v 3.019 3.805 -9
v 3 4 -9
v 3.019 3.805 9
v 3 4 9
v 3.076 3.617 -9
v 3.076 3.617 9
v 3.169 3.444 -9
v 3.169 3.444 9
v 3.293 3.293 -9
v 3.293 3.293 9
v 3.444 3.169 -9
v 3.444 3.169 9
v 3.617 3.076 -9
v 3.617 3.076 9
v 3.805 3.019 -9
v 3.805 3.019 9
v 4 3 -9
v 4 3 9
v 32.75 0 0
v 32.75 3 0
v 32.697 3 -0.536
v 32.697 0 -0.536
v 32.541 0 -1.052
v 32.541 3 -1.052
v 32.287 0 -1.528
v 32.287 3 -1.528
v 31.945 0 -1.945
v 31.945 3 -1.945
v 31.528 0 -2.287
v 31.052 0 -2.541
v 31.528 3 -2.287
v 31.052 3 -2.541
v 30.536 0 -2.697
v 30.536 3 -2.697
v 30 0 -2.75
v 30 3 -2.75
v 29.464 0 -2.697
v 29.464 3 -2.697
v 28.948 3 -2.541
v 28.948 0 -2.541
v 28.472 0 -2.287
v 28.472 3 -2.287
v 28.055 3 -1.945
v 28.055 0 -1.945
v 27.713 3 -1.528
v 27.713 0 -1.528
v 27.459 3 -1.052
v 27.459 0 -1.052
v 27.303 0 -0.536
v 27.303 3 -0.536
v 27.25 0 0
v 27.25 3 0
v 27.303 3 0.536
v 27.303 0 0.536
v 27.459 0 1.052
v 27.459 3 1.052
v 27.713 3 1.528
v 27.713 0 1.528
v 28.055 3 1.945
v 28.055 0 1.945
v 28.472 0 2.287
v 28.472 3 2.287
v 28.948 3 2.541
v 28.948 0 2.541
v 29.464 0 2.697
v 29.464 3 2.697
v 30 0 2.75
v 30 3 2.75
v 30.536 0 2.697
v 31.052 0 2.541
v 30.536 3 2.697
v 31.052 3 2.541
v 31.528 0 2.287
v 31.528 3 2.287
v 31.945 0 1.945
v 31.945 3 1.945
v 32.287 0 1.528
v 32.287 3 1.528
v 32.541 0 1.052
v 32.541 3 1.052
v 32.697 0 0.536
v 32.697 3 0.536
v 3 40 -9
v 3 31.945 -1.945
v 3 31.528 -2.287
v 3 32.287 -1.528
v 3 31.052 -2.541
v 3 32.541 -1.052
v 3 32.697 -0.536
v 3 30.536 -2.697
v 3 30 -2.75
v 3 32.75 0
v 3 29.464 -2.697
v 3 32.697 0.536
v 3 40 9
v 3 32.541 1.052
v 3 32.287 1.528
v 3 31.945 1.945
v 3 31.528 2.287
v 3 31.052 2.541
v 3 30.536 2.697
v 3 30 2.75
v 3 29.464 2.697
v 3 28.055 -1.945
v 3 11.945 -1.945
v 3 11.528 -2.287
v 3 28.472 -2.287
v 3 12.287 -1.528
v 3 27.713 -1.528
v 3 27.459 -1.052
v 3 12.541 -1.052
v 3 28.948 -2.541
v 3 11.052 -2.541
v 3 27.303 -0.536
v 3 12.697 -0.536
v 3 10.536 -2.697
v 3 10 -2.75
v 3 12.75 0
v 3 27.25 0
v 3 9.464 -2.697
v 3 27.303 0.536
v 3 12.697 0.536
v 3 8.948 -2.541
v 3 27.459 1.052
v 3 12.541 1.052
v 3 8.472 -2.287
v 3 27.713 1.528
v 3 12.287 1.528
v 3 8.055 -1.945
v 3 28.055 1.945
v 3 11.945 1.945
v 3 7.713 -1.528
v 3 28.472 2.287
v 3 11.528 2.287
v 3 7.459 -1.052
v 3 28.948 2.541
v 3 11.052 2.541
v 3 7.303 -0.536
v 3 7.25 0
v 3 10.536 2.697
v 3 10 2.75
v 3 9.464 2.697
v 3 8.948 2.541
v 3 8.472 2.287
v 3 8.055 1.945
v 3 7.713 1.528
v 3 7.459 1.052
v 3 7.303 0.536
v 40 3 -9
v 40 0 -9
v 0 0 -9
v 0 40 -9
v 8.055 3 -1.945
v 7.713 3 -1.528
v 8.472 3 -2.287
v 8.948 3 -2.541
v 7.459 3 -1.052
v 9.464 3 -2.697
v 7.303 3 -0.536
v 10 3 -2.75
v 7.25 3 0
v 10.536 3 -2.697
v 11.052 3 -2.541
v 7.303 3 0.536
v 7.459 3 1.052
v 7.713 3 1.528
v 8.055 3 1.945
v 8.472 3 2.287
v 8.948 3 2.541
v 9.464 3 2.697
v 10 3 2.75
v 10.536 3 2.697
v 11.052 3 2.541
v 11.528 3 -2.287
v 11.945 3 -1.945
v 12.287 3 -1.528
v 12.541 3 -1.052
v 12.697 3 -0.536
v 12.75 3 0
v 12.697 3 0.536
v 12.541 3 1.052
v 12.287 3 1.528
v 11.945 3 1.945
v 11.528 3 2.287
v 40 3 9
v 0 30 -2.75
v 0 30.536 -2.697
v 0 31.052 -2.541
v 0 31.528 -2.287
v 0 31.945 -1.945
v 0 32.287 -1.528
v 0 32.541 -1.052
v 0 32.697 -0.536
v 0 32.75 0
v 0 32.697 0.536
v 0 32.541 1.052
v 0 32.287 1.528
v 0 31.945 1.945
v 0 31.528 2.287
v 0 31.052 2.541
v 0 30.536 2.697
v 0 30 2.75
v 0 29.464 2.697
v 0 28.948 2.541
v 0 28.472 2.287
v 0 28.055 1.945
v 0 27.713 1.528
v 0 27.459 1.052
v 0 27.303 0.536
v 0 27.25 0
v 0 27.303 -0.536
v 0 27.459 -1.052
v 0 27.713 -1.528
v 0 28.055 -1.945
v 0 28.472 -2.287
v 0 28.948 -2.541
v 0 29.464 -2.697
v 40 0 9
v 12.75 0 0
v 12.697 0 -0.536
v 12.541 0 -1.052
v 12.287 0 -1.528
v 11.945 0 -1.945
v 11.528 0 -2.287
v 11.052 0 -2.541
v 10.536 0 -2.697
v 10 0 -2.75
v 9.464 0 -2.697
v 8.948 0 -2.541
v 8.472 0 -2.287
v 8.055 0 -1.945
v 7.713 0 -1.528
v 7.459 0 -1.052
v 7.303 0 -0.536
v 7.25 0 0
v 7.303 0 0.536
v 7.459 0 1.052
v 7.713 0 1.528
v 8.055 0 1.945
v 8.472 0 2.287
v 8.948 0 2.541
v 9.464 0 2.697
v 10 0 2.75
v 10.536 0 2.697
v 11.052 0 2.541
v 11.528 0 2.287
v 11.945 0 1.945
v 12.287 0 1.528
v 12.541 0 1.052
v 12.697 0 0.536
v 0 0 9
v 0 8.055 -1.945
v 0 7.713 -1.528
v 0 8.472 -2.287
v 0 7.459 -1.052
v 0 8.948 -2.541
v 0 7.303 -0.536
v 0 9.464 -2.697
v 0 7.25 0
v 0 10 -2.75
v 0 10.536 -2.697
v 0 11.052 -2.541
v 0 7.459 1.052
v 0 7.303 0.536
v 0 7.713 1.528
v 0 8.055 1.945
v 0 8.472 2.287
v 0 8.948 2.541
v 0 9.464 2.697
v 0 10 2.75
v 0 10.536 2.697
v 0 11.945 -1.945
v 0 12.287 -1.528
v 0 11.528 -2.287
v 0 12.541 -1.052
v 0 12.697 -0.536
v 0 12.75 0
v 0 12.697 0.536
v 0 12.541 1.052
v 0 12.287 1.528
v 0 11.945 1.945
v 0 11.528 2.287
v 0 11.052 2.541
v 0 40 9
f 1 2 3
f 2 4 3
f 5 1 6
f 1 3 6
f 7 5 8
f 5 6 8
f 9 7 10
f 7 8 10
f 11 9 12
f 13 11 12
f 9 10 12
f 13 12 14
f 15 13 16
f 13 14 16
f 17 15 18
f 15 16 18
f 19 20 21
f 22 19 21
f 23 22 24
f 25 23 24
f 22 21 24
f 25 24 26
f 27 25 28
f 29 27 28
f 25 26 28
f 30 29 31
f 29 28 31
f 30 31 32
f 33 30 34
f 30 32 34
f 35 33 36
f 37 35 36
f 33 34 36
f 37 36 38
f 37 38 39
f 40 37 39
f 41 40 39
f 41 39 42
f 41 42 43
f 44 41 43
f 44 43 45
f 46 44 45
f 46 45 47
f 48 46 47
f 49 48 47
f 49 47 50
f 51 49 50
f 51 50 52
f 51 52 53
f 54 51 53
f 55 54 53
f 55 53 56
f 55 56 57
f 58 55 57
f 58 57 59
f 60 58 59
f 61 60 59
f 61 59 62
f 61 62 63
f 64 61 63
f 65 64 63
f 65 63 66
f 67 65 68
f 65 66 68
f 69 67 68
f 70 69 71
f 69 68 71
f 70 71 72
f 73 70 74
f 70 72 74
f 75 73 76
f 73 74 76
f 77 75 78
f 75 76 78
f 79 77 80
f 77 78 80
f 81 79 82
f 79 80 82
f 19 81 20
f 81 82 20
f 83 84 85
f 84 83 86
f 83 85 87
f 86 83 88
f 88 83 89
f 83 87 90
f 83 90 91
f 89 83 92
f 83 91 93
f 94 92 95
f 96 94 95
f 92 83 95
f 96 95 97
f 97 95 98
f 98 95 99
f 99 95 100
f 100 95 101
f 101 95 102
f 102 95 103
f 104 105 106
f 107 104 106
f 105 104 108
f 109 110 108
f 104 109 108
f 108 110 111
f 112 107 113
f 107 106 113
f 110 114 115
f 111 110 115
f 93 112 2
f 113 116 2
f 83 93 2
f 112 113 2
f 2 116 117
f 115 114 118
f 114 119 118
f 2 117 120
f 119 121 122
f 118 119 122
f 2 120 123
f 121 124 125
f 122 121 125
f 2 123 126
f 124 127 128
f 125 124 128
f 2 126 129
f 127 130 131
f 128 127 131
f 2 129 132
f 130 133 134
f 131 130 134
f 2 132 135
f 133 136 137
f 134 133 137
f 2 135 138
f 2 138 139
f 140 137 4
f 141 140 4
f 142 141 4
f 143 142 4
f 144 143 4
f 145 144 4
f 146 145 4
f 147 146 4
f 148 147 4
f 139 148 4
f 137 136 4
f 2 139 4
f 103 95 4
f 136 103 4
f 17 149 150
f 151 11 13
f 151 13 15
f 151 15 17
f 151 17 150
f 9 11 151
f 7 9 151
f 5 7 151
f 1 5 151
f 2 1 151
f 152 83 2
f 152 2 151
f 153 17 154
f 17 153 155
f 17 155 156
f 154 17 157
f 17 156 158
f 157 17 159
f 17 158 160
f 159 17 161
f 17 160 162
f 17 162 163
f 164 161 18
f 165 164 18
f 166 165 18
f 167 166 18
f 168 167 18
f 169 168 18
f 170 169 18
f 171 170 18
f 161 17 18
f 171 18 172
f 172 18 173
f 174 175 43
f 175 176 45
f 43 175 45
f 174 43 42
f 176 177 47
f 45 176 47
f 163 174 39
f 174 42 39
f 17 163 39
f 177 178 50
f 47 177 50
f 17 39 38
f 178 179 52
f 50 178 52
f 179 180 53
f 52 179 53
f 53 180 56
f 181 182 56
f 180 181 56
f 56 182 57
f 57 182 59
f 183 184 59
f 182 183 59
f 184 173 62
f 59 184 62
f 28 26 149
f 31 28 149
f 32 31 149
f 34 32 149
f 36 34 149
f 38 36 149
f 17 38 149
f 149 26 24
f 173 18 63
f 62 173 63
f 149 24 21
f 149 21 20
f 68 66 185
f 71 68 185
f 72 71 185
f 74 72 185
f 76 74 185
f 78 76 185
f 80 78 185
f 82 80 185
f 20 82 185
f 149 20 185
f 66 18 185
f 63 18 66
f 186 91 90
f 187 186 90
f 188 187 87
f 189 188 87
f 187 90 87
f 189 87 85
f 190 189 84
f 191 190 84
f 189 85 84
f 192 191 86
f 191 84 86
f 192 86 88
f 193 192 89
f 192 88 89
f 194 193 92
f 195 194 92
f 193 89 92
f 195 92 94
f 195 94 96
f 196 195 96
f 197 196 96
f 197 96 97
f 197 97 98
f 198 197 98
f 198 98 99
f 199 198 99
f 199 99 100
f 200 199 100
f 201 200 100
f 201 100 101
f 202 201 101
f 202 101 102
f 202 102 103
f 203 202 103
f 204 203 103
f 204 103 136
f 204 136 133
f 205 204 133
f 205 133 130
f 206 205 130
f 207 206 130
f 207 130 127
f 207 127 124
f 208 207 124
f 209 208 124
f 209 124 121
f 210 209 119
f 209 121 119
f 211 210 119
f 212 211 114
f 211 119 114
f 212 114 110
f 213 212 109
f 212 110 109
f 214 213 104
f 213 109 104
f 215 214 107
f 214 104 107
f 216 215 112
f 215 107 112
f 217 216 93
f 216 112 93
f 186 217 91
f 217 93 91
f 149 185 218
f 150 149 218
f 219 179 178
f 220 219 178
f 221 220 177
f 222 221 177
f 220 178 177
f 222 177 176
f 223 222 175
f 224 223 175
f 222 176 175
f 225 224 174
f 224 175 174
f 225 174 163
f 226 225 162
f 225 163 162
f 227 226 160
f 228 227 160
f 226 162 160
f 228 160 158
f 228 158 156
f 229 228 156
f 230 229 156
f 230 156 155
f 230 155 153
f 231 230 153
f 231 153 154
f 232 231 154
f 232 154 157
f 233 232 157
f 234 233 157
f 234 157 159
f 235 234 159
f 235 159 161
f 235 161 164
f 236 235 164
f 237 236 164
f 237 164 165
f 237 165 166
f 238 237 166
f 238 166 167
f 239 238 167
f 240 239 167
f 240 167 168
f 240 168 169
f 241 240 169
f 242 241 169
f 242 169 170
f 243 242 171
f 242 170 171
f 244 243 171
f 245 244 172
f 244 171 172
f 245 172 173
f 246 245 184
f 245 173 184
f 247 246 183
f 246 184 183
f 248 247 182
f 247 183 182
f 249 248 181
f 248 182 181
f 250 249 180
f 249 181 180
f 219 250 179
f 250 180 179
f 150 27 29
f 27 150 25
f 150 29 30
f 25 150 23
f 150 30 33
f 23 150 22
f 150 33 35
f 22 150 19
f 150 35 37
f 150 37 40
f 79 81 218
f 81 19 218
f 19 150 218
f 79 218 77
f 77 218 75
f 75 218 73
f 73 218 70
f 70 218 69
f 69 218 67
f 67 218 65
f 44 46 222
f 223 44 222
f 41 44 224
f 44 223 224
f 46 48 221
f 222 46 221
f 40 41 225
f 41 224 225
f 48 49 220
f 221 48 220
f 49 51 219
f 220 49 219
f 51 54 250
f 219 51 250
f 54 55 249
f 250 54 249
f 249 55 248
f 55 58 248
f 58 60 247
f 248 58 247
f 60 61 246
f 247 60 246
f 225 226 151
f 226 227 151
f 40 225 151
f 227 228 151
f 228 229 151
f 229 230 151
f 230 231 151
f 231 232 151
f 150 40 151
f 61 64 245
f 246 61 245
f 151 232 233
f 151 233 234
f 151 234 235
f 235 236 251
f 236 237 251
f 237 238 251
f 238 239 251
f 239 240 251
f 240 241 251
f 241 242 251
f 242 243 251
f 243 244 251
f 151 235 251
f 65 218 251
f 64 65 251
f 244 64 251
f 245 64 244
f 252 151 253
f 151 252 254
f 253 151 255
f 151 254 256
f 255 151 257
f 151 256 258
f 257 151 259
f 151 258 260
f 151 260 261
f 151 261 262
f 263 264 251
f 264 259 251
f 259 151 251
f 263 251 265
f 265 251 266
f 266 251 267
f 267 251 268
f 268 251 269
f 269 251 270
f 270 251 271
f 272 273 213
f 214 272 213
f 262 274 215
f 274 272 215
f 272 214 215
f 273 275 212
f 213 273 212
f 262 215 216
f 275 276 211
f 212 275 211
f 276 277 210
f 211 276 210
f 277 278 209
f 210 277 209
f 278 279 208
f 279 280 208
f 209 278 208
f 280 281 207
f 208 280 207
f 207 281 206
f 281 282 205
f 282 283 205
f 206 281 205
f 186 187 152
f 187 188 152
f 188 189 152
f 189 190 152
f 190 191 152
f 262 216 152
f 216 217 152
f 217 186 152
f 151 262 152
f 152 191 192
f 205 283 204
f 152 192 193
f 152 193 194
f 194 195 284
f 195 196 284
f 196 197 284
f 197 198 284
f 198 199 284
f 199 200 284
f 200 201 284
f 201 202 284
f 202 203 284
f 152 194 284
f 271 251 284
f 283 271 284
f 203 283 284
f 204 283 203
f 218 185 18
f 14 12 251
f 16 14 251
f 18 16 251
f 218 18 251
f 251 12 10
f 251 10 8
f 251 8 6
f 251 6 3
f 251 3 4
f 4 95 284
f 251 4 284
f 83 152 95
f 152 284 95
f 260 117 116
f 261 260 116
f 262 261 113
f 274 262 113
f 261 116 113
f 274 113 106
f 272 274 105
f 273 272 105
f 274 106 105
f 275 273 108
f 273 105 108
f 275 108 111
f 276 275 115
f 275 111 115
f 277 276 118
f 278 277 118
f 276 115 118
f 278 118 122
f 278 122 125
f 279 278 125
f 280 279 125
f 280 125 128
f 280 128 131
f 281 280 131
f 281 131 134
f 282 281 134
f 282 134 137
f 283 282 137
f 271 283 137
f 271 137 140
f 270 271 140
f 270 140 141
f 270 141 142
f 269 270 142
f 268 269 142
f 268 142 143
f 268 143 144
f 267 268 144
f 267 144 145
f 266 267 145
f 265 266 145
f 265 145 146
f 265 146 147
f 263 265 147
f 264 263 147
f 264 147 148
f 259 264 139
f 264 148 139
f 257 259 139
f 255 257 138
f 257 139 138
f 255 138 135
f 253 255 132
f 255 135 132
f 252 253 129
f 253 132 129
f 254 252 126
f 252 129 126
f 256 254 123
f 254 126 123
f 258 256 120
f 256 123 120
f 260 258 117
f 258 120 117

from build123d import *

# Parameters (mm, degrees)
BOSS_EXTRUDE1_DEPTH = 9
SKETCH2_R           = 2.75
CUT_EXTRUDE1_DEPTH  = 4
SKETCH3_R           = 2.75
CUT_EXTRUDE2_DEPTH  = 4


with BuildPart() as part:
    # Sketch1 → Boss-Extrude1 (new body, symmetric)
    with BuildSketch(Plane.XY):
        with BuildLine():
            Line((0, 0), (0, 40))
            Line((0, 40), (3, 40))
            Line((3, 40), (3, 4))
            ThreePointArc((3, 4), (3.292893219, 3.292893219), (4, 3))
            Line((4, 3), (40, 3))
            Line((40, 3), (40, 0))
            Line((40, 0), (0, 0))
        make_face()
    extrude(amount=BOSS_EXTRUDE1_DEPTH, both=True)

    # Sketch2 → Cut-Extrude1 (cut, through all)
    with BuildSketch(Plane(origin=(3, 0, 0), x_dir=(0, 0, -1), z_dir=(1, 0, 0))):
        with Locations((0, 10)):
            Circle(SKETCH2_R)
        with Locations((0, 30)):
            Circle(SKETCH2_R)
    extrude(amount=-CUT_EXTRUDE1_DEPTH, mode=Mode.SUBTRACT)

    # Sketch3 → Cut-Extrude2 (cut, through all)
    with BuildSketch(Plane(origin=(0, 3, 0), x_dir=(1, 0, 0), z_dir=(0, 1, 0))):
        with Locations((10, 0)):
            Circle(SKETCH3_R)
        with Locations((30, 0)):
            Circle(SKETCH3_R)
    extrude(amount=-CUT_EXTRUDE2_DEPTH, mode=Mode.SUBTRACT)


solid = part.part
